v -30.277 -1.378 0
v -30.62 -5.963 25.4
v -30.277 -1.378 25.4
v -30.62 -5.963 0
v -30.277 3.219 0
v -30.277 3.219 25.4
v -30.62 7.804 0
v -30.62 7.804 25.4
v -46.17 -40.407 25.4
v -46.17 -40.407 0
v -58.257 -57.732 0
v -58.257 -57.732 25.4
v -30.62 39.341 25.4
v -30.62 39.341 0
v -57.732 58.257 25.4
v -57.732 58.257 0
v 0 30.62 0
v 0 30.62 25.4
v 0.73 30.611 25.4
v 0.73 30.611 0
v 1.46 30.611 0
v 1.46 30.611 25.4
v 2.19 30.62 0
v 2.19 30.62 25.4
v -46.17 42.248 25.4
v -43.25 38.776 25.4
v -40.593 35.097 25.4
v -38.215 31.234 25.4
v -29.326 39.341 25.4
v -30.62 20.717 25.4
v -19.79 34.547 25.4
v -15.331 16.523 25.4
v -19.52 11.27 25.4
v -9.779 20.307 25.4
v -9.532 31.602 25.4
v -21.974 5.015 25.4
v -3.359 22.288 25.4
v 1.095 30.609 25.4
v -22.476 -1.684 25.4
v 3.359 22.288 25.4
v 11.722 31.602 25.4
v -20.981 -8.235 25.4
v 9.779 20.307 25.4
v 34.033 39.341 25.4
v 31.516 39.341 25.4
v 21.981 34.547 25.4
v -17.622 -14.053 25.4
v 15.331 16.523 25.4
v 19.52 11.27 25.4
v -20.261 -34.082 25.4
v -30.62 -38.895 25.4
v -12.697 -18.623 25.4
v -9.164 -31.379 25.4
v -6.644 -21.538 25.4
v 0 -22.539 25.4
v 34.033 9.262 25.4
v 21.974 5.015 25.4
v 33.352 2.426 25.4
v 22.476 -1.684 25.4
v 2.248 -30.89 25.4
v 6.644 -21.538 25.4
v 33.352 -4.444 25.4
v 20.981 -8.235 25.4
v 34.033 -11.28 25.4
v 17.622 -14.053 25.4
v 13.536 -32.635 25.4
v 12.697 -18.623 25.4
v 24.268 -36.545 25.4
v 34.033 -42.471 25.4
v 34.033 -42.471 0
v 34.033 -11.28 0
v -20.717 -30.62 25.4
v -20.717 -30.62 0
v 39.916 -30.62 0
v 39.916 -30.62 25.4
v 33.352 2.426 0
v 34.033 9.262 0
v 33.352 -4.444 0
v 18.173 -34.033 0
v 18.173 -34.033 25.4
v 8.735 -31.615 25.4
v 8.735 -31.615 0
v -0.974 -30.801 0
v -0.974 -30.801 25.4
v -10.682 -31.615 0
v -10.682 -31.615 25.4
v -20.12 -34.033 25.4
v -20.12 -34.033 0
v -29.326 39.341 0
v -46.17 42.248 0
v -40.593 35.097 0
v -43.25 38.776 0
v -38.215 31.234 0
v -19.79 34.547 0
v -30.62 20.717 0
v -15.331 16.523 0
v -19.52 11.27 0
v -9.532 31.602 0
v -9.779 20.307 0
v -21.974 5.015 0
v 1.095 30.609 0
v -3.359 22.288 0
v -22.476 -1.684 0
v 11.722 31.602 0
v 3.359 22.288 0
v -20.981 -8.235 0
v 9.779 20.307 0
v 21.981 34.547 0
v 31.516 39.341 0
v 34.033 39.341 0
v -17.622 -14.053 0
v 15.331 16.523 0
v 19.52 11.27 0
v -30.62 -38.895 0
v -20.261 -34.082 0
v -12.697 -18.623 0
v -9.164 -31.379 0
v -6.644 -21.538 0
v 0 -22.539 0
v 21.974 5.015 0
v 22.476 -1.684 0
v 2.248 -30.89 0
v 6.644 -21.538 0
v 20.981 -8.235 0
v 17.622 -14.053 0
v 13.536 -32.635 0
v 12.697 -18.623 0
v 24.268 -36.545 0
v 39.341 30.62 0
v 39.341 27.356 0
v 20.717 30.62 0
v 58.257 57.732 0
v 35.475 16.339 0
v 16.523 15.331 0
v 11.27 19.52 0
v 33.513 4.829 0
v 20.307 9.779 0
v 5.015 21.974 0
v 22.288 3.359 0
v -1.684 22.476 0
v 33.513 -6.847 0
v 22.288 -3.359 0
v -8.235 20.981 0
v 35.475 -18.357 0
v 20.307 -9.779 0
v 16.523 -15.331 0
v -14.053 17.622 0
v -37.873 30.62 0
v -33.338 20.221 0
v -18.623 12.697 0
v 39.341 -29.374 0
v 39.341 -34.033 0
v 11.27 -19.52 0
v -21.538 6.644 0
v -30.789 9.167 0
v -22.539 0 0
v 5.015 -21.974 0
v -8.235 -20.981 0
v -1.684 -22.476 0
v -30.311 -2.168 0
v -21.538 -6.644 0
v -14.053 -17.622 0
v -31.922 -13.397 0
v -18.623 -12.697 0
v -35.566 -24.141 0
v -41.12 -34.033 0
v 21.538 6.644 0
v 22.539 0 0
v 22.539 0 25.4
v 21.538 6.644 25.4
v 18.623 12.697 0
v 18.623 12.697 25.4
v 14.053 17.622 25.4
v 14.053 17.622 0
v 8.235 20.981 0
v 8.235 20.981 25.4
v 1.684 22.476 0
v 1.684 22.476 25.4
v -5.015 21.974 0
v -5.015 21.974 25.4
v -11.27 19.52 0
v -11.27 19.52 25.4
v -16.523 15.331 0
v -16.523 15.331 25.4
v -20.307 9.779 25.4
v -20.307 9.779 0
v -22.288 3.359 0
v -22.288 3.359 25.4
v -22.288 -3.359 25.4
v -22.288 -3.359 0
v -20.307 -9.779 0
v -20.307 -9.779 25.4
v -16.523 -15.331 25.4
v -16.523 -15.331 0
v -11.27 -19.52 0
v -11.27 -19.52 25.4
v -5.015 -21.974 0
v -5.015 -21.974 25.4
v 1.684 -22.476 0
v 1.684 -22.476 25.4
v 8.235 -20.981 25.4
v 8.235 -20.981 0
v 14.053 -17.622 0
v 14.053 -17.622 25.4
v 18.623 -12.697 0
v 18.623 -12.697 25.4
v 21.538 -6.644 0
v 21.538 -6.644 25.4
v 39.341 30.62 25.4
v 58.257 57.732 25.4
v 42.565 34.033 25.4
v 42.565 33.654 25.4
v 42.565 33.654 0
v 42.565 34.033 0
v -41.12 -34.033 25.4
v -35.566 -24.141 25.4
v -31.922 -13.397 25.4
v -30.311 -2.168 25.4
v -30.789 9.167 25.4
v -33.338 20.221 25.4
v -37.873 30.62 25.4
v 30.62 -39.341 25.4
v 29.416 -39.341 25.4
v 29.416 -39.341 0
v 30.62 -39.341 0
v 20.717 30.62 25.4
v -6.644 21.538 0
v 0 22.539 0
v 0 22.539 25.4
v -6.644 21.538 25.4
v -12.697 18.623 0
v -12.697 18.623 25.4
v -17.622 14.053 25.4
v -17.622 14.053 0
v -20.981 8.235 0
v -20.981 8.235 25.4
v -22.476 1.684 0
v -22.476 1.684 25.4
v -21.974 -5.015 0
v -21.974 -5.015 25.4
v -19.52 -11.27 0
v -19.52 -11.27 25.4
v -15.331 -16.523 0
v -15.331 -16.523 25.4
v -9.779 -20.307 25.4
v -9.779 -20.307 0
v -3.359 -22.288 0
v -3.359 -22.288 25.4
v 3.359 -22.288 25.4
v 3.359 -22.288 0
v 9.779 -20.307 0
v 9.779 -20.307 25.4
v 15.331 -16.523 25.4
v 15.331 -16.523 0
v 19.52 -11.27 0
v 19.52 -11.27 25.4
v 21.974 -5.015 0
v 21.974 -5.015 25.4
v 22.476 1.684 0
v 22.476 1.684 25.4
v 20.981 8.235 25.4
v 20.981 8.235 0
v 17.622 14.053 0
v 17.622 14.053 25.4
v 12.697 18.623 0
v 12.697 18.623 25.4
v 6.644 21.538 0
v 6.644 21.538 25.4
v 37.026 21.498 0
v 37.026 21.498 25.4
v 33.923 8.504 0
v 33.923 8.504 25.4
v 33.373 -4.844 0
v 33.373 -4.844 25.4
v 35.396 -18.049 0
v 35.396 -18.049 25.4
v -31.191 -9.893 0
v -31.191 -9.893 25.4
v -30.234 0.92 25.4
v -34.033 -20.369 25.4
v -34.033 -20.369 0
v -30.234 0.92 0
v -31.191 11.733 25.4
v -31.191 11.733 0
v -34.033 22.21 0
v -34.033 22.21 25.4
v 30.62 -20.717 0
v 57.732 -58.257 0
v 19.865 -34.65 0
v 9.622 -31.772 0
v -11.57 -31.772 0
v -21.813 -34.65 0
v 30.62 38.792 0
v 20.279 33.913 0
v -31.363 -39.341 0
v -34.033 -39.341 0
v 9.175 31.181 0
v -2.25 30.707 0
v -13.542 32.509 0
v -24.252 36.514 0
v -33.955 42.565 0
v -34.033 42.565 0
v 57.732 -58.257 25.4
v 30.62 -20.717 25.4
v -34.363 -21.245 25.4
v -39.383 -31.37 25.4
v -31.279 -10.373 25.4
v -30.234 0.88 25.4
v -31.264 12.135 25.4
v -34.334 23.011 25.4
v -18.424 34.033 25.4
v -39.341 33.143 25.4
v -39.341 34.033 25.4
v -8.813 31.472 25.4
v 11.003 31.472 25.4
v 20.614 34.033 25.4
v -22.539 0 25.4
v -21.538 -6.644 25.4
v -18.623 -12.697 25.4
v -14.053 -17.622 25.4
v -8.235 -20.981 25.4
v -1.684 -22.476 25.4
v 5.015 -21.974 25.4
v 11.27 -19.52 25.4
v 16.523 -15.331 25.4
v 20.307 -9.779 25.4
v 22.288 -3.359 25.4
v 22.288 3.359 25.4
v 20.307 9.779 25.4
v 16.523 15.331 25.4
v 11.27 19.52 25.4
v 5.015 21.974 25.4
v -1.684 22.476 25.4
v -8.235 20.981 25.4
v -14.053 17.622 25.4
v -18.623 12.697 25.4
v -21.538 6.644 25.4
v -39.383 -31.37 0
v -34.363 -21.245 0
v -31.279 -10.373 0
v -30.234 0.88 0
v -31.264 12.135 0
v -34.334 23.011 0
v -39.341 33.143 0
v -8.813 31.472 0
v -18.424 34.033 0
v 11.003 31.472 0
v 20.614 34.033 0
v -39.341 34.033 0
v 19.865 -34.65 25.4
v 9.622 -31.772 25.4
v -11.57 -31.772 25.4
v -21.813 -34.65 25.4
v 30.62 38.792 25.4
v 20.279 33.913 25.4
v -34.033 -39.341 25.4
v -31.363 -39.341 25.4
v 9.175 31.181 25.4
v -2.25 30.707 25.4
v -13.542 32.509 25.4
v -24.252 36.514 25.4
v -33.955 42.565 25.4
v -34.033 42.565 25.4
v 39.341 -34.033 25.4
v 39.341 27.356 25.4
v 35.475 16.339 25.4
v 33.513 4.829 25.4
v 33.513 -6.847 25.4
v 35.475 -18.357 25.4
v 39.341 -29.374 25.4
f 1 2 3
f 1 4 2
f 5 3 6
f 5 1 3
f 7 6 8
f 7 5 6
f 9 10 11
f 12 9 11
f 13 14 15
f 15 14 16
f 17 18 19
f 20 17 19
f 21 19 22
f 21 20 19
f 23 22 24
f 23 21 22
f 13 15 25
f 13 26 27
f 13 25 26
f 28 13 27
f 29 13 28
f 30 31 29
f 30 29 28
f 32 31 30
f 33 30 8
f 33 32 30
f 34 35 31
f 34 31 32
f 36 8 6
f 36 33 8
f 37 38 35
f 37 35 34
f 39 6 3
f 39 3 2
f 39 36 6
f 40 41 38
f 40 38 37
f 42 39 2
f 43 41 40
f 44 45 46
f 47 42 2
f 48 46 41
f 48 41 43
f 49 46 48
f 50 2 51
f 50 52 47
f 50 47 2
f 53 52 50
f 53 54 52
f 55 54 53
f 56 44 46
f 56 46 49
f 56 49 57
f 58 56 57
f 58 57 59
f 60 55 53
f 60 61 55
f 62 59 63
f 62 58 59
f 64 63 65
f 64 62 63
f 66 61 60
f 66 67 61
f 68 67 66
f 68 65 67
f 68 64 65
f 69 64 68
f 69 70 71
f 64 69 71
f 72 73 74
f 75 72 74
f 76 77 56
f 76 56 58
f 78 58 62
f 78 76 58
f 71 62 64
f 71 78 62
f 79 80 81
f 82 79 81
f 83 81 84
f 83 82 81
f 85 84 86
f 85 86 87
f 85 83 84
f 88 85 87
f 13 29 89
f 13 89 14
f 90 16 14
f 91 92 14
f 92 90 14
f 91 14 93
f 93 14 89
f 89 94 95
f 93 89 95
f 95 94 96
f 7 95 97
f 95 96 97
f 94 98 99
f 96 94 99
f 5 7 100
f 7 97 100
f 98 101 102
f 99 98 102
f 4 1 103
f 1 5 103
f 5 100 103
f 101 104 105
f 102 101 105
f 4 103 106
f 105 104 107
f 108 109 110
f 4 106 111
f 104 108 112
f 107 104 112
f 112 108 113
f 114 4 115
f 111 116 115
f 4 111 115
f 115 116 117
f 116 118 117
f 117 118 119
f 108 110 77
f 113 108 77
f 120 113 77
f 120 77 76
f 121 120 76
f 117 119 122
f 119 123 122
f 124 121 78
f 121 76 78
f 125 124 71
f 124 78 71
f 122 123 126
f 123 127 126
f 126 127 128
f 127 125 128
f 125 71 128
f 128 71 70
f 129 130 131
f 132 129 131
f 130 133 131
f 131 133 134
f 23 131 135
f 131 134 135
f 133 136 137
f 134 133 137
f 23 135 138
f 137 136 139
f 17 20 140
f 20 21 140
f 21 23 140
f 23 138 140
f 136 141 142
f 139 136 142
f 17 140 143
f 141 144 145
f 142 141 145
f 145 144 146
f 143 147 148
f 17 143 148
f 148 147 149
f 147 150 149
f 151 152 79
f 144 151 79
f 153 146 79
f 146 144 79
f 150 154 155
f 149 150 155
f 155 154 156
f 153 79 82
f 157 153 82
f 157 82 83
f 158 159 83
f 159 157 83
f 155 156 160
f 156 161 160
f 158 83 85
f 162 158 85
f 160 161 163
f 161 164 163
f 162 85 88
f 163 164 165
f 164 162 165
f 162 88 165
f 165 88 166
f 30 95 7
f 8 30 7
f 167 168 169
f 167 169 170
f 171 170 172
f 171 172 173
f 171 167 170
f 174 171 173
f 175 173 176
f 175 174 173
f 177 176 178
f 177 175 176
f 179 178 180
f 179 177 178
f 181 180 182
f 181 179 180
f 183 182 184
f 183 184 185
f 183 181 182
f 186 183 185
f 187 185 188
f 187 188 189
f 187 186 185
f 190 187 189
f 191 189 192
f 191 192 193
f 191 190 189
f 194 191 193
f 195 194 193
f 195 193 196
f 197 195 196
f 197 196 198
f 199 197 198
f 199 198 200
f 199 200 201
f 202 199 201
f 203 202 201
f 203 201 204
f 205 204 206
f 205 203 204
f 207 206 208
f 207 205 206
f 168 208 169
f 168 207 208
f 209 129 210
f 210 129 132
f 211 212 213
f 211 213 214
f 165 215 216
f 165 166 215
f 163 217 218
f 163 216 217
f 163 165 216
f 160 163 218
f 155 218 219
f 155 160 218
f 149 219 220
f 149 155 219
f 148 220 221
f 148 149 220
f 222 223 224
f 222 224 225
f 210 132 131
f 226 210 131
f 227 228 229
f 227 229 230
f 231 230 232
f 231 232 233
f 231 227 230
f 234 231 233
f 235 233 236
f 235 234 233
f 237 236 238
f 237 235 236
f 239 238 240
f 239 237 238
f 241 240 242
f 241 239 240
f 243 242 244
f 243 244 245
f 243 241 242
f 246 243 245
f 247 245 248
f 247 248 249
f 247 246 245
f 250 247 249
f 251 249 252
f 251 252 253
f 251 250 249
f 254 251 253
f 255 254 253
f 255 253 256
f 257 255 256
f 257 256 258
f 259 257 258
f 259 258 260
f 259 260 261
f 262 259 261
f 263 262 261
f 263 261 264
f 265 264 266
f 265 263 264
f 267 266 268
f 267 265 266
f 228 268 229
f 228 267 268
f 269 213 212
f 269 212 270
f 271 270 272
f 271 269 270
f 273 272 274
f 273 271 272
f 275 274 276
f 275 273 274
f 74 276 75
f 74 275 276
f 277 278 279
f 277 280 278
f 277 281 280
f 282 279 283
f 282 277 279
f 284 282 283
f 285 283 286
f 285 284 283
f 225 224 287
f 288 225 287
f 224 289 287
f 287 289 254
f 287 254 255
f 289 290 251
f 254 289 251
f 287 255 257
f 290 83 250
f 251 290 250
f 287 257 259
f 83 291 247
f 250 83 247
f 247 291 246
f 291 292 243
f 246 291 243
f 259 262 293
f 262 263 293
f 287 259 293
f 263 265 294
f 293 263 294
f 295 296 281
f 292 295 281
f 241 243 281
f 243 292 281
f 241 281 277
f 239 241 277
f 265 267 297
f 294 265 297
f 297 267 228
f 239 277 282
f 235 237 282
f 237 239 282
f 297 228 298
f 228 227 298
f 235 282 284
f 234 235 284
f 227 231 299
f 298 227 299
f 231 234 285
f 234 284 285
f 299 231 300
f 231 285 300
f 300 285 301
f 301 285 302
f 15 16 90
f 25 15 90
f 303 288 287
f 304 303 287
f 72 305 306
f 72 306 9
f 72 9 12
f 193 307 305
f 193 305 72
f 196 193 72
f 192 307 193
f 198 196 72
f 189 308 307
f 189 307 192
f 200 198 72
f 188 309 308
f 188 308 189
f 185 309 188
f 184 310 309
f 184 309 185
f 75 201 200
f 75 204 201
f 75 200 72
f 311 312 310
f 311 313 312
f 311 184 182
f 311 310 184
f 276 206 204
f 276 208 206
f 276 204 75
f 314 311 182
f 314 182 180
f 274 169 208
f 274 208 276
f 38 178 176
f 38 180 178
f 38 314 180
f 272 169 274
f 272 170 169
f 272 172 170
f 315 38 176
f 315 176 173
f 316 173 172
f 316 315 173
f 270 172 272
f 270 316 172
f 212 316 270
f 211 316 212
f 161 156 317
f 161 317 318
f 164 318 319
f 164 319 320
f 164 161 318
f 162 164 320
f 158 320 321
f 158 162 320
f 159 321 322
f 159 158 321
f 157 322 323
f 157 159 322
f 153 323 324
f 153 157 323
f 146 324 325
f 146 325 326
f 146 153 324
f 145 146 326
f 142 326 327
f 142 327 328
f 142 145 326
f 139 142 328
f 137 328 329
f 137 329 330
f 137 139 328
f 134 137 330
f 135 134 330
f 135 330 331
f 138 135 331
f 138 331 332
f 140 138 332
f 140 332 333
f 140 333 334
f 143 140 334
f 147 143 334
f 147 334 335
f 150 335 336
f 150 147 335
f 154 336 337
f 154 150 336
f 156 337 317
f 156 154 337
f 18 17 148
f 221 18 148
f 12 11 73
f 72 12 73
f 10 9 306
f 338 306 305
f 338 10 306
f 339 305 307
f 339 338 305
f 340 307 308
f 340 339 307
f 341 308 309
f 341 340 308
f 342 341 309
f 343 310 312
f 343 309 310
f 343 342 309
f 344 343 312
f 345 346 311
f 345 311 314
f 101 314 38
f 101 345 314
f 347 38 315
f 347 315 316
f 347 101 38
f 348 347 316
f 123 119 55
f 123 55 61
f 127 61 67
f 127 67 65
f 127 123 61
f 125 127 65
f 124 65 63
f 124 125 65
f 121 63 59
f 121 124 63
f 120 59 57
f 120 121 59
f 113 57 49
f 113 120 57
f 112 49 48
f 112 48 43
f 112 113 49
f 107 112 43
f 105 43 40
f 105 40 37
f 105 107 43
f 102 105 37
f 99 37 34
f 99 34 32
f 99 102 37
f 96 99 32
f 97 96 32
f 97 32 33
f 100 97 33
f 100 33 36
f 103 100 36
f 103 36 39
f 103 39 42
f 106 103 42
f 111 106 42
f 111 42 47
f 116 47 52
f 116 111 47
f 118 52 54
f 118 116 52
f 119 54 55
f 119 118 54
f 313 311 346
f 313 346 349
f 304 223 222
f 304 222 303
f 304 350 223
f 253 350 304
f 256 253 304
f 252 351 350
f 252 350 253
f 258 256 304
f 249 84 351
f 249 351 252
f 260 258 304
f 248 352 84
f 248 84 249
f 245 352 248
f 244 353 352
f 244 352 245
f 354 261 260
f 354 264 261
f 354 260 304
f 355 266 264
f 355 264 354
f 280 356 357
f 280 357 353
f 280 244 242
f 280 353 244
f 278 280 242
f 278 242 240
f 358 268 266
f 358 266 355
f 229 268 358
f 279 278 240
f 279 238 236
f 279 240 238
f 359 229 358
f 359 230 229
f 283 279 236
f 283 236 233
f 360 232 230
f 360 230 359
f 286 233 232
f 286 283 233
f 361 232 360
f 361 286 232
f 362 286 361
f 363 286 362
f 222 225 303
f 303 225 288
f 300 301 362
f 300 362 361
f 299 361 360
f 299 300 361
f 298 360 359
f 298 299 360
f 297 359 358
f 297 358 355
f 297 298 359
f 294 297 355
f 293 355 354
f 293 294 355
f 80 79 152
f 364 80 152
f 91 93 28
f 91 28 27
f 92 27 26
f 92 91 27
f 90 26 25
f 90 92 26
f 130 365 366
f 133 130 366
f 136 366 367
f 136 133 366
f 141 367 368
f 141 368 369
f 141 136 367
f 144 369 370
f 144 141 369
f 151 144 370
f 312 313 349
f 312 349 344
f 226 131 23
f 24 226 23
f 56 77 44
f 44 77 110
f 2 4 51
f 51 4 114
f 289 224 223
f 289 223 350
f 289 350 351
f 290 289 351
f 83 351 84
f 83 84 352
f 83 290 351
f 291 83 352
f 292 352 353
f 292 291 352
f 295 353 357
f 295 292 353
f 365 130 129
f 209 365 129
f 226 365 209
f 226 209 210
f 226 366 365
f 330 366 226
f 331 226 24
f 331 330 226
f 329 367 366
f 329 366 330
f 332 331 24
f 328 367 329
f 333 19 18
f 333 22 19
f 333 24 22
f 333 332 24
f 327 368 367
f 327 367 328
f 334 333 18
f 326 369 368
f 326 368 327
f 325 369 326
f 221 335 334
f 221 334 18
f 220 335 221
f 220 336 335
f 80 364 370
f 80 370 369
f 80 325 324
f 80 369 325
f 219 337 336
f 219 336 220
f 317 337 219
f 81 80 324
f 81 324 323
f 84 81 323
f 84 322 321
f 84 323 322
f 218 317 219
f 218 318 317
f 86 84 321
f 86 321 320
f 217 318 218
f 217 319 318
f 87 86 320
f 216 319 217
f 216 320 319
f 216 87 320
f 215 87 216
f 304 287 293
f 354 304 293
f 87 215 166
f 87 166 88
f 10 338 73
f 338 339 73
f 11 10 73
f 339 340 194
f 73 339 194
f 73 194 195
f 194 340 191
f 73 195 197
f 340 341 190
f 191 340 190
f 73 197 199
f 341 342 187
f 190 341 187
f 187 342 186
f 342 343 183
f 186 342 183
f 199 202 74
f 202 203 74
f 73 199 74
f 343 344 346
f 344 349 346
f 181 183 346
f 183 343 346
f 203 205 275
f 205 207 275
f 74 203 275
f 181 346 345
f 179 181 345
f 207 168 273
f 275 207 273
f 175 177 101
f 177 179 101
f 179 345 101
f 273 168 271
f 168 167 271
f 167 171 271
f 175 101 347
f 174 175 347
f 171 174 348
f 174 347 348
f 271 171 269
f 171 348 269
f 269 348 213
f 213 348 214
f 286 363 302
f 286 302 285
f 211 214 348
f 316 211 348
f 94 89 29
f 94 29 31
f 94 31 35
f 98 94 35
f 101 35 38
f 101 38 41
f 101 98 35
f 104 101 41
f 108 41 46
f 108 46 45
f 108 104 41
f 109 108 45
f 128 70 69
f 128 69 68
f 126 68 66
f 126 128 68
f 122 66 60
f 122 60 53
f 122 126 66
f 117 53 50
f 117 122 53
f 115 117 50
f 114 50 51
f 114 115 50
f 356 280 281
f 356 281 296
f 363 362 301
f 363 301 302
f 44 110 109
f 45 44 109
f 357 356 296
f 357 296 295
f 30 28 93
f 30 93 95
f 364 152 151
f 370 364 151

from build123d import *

# Parameters (mm, degrees)
F0_R     = 22.539349
F1_DEPTH = 25.4
F2_DEPTH = 25.4
F4_COUNT = 4
F5_R     = 57.358193
F5_R_2   = 61.556279
F5_R_3   = 69.26363
F5_R_4   = 58.340394
F6_DEPTH = 25.4


with BuildPart() as f1:
    # F0 (on Top) → F1 (new body)
    with BuildSketch(Plane.XY):
        Polygon((42.564563, 34.032691), (-39.341409, 34.032691), (-39.341409, -30.619942), (-20.717202, -30.619942), (42.564563, -30.619942), align=None)
        Circle(F0_R, mode=Mode.SUBTRACT)
    extrude(amount=F1_DEPTH)

    # F0 (on Top) → F2 (join)
    with BuildSketch(Plane.XY):
        Polygon((-20.717202, -30.619942), (-39.341409, -30.619942), (-58.257438, -57.732336), align=None)
    extrude(amount=F2_DEPTH)


with BuildPart() as f4_1:
    # F4: instance of F1
    add(f1.part.rotate(Axis((0, 0, 12.371215), (0, 0, 1)), 1 * 360 / F4_COUNT))


with BuildPart() as f4_2:
    # F4: instance of F1
    add(f1.part.rotate(Axis((0, 0, 12.371215), (0, 0, 1)), 2 * 360 / F4_COUNT))


with BuildPart() as f4_3:
    # F4: instance of F1
    add(f1.part.rotate(Axis((0, 0, 12.371215), (0, 0, 1)), 3 * 360 / F4_COUNT))


with BuildPart() as f6_tool:
    # F5 (on Top) → F6 (new body)
    with BuildSketch(Plane.XY):
        with Locations((1.095151, 87.967679)):
            Circle(F5_R)
        with Locations((-91.790144, 0.920364)):
            Circle(F5_R_2)
        with Locations((102.530583, -1.008815)):
            Circle(F5_R_3)
        with Locations((-0.973841, -89.141804)):
            Circle(F5_R_4)
    extrude(amount=F6_DEPTH)


with BuildPart() as f1_1:
    add(f1.part)

    # F6: cut by f6_tool
    add(f6_tool.part, mode=Mode.SUBTRACT)


with BuildPart() as f4_1_1:
    add(f4_1.part)

    # F6: cut by f6_tool
    add(f6_tool.part, mode=Mode.SUBTRACT)


with BuildPart() as f4_2_1:
    add(f4_2.part)

    # F6: cut by f6_tool
    add(f6_tool.part, mode=Mode.SUBTRACT)


with BuildPart() as f4_3_1:
    add(f4_3.part)

    # F6: cut by f6_tool
    add(f6_tool.part, mode=Mode.SUBTRACT)


solid = Compound([f1_1.part, f4_1_1.part, f4_2_1.part, f4_3_1.part])
